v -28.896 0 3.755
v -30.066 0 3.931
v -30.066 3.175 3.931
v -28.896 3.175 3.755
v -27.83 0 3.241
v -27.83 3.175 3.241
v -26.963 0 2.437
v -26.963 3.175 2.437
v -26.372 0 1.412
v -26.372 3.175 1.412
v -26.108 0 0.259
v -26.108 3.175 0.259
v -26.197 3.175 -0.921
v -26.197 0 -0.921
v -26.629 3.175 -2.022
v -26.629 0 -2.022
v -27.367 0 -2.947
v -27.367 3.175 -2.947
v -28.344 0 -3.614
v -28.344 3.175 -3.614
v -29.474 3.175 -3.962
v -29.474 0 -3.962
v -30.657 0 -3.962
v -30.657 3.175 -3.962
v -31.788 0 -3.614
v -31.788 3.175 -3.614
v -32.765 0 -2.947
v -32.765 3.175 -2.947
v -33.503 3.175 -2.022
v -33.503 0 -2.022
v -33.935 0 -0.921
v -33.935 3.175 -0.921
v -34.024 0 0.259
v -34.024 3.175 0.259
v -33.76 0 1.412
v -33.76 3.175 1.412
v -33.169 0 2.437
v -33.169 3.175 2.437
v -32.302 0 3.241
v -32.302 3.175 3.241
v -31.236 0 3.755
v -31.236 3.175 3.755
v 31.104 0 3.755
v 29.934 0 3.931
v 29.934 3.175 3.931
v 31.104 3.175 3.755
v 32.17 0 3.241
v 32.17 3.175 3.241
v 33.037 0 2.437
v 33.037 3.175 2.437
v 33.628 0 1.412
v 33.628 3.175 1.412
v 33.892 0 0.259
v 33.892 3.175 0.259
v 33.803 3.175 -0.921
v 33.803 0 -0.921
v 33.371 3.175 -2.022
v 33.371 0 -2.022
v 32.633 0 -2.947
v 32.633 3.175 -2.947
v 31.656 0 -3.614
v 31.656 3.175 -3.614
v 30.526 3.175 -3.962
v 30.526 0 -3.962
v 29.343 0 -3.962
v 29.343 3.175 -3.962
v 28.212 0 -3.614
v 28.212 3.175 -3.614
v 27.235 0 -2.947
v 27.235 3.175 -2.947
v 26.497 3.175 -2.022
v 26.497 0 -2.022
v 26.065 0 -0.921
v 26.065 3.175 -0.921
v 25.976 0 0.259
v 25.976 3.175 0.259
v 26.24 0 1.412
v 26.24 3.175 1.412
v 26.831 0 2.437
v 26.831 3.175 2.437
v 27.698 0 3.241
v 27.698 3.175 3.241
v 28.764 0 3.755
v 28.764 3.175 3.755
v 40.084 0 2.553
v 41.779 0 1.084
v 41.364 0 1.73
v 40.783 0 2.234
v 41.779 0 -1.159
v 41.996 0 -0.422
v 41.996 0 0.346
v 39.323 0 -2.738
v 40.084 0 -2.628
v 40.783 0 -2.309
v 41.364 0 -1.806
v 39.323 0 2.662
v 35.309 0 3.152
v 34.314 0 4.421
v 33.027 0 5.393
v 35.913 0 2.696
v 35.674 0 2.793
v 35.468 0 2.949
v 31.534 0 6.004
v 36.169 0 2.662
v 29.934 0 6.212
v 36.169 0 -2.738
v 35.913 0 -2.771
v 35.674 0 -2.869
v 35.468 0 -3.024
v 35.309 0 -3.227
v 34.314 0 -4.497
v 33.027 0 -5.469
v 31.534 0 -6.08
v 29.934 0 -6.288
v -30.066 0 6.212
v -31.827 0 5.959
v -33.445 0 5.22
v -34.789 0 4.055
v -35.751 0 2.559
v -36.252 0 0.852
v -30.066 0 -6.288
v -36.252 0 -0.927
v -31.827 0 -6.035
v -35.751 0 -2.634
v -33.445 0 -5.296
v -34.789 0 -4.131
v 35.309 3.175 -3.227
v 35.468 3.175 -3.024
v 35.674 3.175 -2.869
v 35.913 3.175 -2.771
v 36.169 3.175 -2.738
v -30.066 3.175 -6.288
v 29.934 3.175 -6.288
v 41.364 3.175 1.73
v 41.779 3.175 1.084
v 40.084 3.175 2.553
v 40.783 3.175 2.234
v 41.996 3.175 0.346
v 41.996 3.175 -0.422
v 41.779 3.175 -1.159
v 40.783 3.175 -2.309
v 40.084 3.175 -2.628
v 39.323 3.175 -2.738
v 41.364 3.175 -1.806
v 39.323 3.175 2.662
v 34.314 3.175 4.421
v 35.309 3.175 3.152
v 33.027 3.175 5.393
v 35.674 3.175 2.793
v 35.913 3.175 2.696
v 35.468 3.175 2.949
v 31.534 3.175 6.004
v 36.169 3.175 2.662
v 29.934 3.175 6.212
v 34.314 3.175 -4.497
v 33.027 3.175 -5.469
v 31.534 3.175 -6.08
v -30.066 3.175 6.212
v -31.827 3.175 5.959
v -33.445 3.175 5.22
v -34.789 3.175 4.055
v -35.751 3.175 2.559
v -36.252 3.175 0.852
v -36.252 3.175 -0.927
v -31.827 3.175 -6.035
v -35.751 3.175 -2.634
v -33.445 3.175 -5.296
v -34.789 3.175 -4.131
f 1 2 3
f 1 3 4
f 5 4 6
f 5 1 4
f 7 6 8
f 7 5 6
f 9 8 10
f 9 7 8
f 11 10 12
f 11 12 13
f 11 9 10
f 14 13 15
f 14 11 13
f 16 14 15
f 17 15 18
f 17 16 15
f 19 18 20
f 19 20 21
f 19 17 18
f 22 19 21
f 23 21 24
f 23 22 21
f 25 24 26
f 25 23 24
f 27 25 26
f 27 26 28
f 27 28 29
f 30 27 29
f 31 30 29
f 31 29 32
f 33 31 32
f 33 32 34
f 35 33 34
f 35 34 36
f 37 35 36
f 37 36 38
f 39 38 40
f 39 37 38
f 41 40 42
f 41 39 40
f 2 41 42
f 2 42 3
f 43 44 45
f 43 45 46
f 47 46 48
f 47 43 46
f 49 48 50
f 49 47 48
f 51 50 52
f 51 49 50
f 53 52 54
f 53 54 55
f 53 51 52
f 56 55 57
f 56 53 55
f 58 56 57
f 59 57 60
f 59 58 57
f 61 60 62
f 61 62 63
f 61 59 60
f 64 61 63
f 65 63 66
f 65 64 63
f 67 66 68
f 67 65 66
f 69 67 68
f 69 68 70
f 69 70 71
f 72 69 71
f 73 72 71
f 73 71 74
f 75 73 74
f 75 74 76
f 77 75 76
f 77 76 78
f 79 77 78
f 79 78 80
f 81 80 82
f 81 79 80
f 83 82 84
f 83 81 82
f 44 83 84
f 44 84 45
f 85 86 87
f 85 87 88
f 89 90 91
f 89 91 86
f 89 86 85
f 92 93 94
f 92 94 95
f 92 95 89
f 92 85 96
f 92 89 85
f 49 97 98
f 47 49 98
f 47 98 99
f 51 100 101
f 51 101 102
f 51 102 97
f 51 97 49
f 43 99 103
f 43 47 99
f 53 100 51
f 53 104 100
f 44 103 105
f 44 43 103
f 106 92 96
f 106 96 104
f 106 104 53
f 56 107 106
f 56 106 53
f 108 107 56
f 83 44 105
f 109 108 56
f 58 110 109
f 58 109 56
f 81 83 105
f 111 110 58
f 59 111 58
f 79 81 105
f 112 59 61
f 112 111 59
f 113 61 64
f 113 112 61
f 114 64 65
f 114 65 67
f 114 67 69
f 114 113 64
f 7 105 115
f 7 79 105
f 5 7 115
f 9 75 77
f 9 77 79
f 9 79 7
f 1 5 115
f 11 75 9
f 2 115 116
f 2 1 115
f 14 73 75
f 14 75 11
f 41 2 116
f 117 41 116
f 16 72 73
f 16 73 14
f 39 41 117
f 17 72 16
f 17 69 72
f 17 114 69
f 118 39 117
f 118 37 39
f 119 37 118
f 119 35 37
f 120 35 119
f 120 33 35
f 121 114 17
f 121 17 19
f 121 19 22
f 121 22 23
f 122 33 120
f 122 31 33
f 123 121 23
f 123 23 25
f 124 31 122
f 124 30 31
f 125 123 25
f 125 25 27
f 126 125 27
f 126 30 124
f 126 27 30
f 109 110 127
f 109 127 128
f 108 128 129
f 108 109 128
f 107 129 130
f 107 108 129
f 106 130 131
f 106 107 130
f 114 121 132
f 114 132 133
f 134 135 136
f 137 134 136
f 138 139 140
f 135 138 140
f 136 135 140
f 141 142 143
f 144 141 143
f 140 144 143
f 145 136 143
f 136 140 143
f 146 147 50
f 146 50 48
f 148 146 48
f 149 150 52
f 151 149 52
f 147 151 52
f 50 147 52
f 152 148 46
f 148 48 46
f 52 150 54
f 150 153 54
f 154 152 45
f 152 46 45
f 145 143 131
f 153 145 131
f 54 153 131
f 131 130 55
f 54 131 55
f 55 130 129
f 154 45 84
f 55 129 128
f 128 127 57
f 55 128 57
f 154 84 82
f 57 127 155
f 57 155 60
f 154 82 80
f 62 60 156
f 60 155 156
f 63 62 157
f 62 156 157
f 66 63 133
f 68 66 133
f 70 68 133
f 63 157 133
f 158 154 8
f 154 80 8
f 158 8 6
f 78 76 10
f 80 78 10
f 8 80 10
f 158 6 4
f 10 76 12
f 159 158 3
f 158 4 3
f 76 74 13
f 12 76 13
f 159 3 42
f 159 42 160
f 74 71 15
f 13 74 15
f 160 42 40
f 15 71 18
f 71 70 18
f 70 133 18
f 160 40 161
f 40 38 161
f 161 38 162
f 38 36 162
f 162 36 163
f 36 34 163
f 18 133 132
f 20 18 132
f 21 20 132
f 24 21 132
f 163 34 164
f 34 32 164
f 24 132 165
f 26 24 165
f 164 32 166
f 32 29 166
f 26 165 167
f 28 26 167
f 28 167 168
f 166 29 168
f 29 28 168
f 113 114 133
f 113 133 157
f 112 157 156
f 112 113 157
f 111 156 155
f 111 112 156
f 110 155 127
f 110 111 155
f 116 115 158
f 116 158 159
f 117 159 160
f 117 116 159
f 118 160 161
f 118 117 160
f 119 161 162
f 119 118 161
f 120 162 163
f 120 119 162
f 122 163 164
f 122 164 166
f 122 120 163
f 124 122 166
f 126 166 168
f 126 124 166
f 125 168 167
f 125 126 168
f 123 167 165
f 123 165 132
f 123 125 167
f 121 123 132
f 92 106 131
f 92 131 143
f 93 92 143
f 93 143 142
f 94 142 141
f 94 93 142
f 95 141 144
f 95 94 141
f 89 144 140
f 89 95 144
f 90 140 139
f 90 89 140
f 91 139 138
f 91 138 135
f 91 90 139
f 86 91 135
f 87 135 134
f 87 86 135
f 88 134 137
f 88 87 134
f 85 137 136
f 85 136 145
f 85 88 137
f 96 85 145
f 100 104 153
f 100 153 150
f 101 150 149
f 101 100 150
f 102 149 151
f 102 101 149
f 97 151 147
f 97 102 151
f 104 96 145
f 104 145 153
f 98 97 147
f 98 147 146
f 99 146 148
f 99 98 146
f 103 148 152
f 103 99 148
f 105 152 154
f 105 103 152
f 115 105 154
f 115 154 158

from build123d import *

# Parameters (mm, degrees)
SKETCH1_R           = 3.96875
BOSS_EXTRUDE1_DEPTH = 3.175


with BuildPart() as part:
    # Sketch1 → Boss-Extrude1 (new body)
    with BuildSketch(Plane(origin=(0, 0, 0), x_dir=(1, 0, 0), z_dir=(0, 1, 0))):
        with BuildLine():
            Line((-30.06597498, 6.287799421), (29.93402502, 6.287799421))
            ThreePointArc((29.93402502, 6.287799421), (33.02652847, 5.469090466), (35.308836634, 3.227454594))
            ThreePointArc((35.308836634, 3.227454594), (35.67400594, 2.868792854), (36.168806492, 2.737799421))
            Line((36.168806492, 2.737799421), (39.323343513, 2.737799421))
            ThreePointArc((39.323343513, 2.737799421), (42.023343513, 0.037799421), (39.323343513, -2.662200579))
            Line((39.323343513, -2.662200579), (36.168806492, -2.662200579))
            ThreePointArc((36.168806492, -2.662200579), (35.67400594, -2.793194011), (35.308836634, -3.151855751))
            ThreePointArc((35.308836634, -3.151855751), (33.02652847, -5.393491623), (29.93402502, -6.212200579))
            Line((29.93402502, -6.212200579), (-30.06597498, -6.212200579))
            ThreePointArc((-30.06597498, -6.212200579), (-36.31597498, 0.037799421), (-30.06597498, 6.287799421))
        make_face()
        with Locations(Location((-30.06597498, 0.037799421, 0), (0, 0, 270))):
            Circle(SKETCH1_R, mode=Mode.SUBTRACT)
        with Locations(Location((29.93402502, 0.037799421, 0), (0, 0, 270))):
            Circle(SKETCH1_R, mode=Mode.SUBTRACT)
    extrude(amount=BOSS_EXTRUDE1_DEPTH)


solid = part.part
